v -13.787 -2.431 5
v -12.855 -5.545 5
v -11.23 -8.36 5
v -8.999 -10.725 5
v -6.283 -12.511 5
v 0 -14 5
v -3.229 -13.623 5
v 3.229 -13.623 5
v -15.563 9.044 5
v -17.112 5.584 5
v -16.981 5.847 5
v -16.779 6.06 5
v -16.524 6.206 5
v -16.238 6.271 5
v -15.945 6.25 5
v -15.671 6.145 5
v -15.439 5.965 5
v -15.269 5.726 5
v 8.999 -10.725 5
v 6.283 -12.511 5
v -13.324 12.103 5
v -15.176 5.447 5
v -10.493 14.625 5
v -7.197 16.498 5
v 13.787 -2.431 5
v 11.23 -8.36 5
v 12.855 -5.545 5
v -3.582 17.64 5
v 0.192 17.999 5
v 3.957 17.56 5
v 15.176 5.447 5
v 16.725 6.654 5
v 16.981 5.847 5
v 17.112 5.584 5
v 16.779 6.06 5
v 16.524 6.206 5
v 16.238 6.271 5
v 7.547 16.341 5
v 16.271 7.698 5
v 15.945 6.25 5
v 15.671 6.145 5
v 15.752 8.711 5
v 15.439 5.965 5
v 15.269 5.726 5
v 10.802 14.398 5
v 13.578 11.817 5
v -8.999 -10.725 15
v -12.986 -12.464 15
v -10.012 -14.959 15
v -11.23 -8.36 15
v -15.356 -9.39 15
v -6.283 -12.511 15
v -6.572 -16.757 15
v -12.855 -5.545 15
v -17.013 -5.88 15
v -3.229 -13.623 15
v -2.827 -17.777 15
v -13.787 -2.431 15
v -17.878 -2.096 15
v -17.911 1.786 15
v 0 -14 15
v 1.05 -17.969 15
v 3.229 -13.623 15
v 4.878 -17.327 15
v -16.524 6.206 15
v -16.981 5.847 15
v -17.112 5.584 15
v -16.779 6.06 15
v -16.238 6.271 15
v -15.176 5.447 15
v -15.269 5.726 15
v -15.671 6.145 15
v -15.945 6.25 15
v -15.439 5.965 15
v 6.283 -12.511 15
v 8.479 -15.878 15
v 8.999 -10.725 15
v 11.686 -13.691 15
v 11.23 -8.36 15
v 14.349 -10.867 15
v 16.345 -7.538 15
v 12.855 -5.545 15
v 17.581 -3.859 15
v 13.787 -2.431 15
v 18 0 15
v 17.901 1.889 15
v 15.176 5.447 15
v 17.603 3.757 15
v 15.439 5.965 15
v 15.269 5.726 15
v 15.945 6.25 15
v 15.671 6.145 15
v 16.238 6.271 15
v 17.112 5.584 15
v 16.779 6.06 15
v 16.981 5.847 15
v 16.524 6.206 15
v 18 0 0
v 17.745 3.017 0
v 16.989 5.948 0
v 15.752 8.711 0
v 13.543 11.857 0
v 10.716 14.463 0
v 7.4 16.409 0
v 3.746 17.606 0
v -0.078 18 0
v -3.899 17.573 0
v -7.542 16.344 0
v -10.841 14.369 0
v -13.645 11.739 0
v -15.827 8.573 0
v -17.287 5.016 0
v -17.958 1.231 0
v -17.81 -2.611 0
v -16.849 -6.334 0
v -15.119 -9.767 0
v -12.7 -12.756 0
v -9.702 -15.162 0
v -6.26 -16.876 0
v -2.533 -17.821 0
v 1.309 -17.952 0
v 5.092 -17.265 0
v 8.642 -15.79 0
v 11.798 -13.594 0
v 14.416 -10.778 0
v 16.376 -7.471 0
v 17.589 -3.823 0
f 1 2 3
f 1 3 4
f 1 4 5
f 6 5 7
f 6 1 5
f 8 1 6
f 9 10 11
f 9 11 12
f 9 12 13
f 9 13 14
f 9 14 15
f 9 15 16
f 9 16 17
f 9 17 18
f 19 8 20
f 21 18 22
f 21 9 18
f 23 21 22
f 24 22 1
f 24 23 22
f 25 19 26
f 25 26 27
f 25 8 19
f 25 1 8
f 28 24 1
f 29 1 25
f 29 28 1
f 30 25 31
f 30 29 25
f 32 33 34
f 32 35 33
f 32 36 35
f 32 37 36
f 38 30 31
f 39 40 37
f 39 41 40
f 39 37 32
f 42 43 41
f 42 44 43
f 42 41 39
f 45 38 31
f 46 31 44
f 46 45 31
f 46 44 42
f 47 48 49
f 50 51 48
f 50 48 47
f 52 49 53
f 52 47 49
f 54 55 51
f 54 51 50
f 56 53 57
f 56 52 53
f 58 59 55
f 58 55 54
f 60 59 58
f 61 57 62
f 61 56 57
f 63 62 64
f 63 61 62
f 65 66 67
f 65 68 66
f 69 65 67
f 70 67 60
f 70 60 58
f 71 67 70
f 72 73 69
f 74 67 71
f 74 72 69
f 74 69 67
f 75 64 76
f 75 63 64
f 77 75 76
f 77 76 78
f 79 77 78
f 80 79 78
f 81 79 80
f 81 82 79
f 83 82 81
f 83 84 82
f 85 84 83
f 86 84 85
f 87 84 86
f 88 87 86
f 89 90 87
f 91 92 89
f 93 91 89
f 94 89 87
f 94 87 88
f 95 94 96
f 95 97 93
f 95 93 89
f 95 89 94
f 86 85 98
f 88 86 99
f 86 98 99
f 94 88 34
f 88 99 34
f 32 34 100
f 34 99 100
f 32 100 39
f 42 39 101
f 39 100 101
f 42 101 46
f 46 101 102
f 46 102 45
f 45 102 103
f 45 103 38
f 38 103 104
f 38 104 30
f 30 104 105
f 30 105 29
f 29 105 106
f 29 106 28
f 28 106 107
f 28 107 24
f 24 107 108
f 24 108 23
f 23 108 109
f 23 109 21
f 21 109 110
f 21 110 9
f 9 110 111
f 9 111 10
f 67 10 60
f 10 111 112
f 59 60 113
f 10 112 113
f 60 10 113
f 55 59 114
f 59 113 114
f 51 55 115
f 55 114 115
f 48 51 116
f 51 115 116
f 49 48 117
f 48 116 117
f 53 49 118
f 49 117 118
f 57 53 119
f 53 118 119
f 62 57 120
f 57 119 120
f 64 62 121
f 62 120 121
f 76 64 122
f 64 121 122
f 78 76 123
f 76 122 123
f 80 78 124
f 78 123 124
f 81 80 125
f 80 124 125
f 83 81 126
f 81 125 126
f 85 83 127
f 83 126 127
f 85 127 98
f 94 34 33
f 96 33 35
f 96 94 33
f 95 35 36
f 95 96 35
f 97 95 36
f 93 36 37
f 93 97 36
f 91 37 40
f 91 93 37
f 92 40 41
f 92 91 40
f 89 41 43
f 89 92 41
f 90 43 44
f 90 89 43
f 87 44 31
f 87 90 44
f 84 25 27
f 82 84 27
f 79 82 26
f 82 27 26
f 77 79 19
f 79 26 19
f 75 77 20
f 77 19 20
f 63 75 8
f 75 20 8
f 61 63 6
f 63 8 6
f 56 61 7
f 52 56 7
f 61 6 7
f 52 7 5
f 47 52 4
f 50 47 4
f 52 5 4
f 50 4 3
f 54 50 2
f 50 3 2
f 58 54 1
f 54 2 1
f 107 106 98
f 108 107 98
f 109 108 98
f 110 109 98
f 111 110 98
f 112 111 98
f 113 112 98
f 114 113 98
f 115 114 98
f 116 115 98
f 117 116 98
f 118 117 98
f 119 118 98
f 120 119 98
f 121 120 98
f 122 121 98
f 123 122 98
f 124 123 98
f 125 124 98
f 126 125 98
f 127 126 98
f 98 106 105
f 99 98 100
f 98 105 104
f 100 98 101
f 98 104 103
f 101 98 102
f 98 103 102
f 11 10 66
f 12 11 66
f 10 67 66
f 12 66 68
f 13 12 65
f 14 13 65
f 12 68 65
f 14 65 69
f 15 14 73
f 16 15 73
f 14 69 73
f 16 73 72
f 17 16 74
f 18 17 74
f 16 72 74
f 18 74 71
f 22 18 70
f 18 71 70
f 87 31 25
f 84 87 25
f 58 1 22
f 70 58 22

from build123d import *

# Parameters (mm, degrees)
F1_DEPTH = 5
F2_DEPTH = 15
F3_R     = 1


with BuildPart() as f1:
    # F0 (on Top) → F1 (new body)
    with BuildSketch(Plane.XY):
        with BuildLine():
            ThreePointArc((-13.7873085422, -2.4310744873), (0, -14), (13.7873085422, -2.4310744873))
            ThreePointArc((13.7873085422, -2.4310744873), (13.9467257733, -1.2201803985), (14, 0))
            ThreePointArc((14, 0), (-1.2201803985, 13.9467257733), (-13.7873085422, -2.4310744873))
        make_face()
        with BuildLine():
            Line((13.7873085422, -2.4310744873), (15.7519134057, 8.7107533578))
            ThreePointArc((15.7519134057, 8.7107533578), (0, 18), (-15.7519134057, 8.7107533578))
            Line((-15.7519134057, 8.7107533578), (-13.7873085422, -2.4310744873))
            ThreePointArc((-13.7873085422, -2.4310744873), (-1.2201803985, 13.9467257733), (14, 0))
            ThreePointArc((14, 0), (13.9467257733, -1.2201803985), (13.7873085422, -2.4310744873))
        make_face()
    extrude(amount=F1_DEPTH)

    # F0 (on Top) → F2 (join)
    with BuildSketch(Plane.XY):
        with BuildLine():
            ThreePointArc((-15.7519134057, 8.7107533578), (-4.4980861874, -17.4289190902), (18, 0))
            ThreePointArc((18, 0), (17.4289190902, 4.4980861874), (15.7519134057, 8.7107533578))
            Line((15.7519134057, 8.7107533578), (13.7873085422, -2.4310744873))
            ThreePointArc((13.7873085422, -2.4310744873), (0, -14), (-13.7873085422, -2.4310744873))
            Line((-13.7873085422, -2.4310744873), (-15.7519134057, 8.7107533578))
        make_face()
    extrude(amount=F2_DEPTH)

    # F3
    f3_edges = [f1.edges().sort_by_distance(p)[0] for p in [
        (-15.751913, 8.710753, 10),
        (15.751913, 8.710753, 10),
    ]]
    fillet(f3_edges, radius=F3_R)


solid = f1.part
